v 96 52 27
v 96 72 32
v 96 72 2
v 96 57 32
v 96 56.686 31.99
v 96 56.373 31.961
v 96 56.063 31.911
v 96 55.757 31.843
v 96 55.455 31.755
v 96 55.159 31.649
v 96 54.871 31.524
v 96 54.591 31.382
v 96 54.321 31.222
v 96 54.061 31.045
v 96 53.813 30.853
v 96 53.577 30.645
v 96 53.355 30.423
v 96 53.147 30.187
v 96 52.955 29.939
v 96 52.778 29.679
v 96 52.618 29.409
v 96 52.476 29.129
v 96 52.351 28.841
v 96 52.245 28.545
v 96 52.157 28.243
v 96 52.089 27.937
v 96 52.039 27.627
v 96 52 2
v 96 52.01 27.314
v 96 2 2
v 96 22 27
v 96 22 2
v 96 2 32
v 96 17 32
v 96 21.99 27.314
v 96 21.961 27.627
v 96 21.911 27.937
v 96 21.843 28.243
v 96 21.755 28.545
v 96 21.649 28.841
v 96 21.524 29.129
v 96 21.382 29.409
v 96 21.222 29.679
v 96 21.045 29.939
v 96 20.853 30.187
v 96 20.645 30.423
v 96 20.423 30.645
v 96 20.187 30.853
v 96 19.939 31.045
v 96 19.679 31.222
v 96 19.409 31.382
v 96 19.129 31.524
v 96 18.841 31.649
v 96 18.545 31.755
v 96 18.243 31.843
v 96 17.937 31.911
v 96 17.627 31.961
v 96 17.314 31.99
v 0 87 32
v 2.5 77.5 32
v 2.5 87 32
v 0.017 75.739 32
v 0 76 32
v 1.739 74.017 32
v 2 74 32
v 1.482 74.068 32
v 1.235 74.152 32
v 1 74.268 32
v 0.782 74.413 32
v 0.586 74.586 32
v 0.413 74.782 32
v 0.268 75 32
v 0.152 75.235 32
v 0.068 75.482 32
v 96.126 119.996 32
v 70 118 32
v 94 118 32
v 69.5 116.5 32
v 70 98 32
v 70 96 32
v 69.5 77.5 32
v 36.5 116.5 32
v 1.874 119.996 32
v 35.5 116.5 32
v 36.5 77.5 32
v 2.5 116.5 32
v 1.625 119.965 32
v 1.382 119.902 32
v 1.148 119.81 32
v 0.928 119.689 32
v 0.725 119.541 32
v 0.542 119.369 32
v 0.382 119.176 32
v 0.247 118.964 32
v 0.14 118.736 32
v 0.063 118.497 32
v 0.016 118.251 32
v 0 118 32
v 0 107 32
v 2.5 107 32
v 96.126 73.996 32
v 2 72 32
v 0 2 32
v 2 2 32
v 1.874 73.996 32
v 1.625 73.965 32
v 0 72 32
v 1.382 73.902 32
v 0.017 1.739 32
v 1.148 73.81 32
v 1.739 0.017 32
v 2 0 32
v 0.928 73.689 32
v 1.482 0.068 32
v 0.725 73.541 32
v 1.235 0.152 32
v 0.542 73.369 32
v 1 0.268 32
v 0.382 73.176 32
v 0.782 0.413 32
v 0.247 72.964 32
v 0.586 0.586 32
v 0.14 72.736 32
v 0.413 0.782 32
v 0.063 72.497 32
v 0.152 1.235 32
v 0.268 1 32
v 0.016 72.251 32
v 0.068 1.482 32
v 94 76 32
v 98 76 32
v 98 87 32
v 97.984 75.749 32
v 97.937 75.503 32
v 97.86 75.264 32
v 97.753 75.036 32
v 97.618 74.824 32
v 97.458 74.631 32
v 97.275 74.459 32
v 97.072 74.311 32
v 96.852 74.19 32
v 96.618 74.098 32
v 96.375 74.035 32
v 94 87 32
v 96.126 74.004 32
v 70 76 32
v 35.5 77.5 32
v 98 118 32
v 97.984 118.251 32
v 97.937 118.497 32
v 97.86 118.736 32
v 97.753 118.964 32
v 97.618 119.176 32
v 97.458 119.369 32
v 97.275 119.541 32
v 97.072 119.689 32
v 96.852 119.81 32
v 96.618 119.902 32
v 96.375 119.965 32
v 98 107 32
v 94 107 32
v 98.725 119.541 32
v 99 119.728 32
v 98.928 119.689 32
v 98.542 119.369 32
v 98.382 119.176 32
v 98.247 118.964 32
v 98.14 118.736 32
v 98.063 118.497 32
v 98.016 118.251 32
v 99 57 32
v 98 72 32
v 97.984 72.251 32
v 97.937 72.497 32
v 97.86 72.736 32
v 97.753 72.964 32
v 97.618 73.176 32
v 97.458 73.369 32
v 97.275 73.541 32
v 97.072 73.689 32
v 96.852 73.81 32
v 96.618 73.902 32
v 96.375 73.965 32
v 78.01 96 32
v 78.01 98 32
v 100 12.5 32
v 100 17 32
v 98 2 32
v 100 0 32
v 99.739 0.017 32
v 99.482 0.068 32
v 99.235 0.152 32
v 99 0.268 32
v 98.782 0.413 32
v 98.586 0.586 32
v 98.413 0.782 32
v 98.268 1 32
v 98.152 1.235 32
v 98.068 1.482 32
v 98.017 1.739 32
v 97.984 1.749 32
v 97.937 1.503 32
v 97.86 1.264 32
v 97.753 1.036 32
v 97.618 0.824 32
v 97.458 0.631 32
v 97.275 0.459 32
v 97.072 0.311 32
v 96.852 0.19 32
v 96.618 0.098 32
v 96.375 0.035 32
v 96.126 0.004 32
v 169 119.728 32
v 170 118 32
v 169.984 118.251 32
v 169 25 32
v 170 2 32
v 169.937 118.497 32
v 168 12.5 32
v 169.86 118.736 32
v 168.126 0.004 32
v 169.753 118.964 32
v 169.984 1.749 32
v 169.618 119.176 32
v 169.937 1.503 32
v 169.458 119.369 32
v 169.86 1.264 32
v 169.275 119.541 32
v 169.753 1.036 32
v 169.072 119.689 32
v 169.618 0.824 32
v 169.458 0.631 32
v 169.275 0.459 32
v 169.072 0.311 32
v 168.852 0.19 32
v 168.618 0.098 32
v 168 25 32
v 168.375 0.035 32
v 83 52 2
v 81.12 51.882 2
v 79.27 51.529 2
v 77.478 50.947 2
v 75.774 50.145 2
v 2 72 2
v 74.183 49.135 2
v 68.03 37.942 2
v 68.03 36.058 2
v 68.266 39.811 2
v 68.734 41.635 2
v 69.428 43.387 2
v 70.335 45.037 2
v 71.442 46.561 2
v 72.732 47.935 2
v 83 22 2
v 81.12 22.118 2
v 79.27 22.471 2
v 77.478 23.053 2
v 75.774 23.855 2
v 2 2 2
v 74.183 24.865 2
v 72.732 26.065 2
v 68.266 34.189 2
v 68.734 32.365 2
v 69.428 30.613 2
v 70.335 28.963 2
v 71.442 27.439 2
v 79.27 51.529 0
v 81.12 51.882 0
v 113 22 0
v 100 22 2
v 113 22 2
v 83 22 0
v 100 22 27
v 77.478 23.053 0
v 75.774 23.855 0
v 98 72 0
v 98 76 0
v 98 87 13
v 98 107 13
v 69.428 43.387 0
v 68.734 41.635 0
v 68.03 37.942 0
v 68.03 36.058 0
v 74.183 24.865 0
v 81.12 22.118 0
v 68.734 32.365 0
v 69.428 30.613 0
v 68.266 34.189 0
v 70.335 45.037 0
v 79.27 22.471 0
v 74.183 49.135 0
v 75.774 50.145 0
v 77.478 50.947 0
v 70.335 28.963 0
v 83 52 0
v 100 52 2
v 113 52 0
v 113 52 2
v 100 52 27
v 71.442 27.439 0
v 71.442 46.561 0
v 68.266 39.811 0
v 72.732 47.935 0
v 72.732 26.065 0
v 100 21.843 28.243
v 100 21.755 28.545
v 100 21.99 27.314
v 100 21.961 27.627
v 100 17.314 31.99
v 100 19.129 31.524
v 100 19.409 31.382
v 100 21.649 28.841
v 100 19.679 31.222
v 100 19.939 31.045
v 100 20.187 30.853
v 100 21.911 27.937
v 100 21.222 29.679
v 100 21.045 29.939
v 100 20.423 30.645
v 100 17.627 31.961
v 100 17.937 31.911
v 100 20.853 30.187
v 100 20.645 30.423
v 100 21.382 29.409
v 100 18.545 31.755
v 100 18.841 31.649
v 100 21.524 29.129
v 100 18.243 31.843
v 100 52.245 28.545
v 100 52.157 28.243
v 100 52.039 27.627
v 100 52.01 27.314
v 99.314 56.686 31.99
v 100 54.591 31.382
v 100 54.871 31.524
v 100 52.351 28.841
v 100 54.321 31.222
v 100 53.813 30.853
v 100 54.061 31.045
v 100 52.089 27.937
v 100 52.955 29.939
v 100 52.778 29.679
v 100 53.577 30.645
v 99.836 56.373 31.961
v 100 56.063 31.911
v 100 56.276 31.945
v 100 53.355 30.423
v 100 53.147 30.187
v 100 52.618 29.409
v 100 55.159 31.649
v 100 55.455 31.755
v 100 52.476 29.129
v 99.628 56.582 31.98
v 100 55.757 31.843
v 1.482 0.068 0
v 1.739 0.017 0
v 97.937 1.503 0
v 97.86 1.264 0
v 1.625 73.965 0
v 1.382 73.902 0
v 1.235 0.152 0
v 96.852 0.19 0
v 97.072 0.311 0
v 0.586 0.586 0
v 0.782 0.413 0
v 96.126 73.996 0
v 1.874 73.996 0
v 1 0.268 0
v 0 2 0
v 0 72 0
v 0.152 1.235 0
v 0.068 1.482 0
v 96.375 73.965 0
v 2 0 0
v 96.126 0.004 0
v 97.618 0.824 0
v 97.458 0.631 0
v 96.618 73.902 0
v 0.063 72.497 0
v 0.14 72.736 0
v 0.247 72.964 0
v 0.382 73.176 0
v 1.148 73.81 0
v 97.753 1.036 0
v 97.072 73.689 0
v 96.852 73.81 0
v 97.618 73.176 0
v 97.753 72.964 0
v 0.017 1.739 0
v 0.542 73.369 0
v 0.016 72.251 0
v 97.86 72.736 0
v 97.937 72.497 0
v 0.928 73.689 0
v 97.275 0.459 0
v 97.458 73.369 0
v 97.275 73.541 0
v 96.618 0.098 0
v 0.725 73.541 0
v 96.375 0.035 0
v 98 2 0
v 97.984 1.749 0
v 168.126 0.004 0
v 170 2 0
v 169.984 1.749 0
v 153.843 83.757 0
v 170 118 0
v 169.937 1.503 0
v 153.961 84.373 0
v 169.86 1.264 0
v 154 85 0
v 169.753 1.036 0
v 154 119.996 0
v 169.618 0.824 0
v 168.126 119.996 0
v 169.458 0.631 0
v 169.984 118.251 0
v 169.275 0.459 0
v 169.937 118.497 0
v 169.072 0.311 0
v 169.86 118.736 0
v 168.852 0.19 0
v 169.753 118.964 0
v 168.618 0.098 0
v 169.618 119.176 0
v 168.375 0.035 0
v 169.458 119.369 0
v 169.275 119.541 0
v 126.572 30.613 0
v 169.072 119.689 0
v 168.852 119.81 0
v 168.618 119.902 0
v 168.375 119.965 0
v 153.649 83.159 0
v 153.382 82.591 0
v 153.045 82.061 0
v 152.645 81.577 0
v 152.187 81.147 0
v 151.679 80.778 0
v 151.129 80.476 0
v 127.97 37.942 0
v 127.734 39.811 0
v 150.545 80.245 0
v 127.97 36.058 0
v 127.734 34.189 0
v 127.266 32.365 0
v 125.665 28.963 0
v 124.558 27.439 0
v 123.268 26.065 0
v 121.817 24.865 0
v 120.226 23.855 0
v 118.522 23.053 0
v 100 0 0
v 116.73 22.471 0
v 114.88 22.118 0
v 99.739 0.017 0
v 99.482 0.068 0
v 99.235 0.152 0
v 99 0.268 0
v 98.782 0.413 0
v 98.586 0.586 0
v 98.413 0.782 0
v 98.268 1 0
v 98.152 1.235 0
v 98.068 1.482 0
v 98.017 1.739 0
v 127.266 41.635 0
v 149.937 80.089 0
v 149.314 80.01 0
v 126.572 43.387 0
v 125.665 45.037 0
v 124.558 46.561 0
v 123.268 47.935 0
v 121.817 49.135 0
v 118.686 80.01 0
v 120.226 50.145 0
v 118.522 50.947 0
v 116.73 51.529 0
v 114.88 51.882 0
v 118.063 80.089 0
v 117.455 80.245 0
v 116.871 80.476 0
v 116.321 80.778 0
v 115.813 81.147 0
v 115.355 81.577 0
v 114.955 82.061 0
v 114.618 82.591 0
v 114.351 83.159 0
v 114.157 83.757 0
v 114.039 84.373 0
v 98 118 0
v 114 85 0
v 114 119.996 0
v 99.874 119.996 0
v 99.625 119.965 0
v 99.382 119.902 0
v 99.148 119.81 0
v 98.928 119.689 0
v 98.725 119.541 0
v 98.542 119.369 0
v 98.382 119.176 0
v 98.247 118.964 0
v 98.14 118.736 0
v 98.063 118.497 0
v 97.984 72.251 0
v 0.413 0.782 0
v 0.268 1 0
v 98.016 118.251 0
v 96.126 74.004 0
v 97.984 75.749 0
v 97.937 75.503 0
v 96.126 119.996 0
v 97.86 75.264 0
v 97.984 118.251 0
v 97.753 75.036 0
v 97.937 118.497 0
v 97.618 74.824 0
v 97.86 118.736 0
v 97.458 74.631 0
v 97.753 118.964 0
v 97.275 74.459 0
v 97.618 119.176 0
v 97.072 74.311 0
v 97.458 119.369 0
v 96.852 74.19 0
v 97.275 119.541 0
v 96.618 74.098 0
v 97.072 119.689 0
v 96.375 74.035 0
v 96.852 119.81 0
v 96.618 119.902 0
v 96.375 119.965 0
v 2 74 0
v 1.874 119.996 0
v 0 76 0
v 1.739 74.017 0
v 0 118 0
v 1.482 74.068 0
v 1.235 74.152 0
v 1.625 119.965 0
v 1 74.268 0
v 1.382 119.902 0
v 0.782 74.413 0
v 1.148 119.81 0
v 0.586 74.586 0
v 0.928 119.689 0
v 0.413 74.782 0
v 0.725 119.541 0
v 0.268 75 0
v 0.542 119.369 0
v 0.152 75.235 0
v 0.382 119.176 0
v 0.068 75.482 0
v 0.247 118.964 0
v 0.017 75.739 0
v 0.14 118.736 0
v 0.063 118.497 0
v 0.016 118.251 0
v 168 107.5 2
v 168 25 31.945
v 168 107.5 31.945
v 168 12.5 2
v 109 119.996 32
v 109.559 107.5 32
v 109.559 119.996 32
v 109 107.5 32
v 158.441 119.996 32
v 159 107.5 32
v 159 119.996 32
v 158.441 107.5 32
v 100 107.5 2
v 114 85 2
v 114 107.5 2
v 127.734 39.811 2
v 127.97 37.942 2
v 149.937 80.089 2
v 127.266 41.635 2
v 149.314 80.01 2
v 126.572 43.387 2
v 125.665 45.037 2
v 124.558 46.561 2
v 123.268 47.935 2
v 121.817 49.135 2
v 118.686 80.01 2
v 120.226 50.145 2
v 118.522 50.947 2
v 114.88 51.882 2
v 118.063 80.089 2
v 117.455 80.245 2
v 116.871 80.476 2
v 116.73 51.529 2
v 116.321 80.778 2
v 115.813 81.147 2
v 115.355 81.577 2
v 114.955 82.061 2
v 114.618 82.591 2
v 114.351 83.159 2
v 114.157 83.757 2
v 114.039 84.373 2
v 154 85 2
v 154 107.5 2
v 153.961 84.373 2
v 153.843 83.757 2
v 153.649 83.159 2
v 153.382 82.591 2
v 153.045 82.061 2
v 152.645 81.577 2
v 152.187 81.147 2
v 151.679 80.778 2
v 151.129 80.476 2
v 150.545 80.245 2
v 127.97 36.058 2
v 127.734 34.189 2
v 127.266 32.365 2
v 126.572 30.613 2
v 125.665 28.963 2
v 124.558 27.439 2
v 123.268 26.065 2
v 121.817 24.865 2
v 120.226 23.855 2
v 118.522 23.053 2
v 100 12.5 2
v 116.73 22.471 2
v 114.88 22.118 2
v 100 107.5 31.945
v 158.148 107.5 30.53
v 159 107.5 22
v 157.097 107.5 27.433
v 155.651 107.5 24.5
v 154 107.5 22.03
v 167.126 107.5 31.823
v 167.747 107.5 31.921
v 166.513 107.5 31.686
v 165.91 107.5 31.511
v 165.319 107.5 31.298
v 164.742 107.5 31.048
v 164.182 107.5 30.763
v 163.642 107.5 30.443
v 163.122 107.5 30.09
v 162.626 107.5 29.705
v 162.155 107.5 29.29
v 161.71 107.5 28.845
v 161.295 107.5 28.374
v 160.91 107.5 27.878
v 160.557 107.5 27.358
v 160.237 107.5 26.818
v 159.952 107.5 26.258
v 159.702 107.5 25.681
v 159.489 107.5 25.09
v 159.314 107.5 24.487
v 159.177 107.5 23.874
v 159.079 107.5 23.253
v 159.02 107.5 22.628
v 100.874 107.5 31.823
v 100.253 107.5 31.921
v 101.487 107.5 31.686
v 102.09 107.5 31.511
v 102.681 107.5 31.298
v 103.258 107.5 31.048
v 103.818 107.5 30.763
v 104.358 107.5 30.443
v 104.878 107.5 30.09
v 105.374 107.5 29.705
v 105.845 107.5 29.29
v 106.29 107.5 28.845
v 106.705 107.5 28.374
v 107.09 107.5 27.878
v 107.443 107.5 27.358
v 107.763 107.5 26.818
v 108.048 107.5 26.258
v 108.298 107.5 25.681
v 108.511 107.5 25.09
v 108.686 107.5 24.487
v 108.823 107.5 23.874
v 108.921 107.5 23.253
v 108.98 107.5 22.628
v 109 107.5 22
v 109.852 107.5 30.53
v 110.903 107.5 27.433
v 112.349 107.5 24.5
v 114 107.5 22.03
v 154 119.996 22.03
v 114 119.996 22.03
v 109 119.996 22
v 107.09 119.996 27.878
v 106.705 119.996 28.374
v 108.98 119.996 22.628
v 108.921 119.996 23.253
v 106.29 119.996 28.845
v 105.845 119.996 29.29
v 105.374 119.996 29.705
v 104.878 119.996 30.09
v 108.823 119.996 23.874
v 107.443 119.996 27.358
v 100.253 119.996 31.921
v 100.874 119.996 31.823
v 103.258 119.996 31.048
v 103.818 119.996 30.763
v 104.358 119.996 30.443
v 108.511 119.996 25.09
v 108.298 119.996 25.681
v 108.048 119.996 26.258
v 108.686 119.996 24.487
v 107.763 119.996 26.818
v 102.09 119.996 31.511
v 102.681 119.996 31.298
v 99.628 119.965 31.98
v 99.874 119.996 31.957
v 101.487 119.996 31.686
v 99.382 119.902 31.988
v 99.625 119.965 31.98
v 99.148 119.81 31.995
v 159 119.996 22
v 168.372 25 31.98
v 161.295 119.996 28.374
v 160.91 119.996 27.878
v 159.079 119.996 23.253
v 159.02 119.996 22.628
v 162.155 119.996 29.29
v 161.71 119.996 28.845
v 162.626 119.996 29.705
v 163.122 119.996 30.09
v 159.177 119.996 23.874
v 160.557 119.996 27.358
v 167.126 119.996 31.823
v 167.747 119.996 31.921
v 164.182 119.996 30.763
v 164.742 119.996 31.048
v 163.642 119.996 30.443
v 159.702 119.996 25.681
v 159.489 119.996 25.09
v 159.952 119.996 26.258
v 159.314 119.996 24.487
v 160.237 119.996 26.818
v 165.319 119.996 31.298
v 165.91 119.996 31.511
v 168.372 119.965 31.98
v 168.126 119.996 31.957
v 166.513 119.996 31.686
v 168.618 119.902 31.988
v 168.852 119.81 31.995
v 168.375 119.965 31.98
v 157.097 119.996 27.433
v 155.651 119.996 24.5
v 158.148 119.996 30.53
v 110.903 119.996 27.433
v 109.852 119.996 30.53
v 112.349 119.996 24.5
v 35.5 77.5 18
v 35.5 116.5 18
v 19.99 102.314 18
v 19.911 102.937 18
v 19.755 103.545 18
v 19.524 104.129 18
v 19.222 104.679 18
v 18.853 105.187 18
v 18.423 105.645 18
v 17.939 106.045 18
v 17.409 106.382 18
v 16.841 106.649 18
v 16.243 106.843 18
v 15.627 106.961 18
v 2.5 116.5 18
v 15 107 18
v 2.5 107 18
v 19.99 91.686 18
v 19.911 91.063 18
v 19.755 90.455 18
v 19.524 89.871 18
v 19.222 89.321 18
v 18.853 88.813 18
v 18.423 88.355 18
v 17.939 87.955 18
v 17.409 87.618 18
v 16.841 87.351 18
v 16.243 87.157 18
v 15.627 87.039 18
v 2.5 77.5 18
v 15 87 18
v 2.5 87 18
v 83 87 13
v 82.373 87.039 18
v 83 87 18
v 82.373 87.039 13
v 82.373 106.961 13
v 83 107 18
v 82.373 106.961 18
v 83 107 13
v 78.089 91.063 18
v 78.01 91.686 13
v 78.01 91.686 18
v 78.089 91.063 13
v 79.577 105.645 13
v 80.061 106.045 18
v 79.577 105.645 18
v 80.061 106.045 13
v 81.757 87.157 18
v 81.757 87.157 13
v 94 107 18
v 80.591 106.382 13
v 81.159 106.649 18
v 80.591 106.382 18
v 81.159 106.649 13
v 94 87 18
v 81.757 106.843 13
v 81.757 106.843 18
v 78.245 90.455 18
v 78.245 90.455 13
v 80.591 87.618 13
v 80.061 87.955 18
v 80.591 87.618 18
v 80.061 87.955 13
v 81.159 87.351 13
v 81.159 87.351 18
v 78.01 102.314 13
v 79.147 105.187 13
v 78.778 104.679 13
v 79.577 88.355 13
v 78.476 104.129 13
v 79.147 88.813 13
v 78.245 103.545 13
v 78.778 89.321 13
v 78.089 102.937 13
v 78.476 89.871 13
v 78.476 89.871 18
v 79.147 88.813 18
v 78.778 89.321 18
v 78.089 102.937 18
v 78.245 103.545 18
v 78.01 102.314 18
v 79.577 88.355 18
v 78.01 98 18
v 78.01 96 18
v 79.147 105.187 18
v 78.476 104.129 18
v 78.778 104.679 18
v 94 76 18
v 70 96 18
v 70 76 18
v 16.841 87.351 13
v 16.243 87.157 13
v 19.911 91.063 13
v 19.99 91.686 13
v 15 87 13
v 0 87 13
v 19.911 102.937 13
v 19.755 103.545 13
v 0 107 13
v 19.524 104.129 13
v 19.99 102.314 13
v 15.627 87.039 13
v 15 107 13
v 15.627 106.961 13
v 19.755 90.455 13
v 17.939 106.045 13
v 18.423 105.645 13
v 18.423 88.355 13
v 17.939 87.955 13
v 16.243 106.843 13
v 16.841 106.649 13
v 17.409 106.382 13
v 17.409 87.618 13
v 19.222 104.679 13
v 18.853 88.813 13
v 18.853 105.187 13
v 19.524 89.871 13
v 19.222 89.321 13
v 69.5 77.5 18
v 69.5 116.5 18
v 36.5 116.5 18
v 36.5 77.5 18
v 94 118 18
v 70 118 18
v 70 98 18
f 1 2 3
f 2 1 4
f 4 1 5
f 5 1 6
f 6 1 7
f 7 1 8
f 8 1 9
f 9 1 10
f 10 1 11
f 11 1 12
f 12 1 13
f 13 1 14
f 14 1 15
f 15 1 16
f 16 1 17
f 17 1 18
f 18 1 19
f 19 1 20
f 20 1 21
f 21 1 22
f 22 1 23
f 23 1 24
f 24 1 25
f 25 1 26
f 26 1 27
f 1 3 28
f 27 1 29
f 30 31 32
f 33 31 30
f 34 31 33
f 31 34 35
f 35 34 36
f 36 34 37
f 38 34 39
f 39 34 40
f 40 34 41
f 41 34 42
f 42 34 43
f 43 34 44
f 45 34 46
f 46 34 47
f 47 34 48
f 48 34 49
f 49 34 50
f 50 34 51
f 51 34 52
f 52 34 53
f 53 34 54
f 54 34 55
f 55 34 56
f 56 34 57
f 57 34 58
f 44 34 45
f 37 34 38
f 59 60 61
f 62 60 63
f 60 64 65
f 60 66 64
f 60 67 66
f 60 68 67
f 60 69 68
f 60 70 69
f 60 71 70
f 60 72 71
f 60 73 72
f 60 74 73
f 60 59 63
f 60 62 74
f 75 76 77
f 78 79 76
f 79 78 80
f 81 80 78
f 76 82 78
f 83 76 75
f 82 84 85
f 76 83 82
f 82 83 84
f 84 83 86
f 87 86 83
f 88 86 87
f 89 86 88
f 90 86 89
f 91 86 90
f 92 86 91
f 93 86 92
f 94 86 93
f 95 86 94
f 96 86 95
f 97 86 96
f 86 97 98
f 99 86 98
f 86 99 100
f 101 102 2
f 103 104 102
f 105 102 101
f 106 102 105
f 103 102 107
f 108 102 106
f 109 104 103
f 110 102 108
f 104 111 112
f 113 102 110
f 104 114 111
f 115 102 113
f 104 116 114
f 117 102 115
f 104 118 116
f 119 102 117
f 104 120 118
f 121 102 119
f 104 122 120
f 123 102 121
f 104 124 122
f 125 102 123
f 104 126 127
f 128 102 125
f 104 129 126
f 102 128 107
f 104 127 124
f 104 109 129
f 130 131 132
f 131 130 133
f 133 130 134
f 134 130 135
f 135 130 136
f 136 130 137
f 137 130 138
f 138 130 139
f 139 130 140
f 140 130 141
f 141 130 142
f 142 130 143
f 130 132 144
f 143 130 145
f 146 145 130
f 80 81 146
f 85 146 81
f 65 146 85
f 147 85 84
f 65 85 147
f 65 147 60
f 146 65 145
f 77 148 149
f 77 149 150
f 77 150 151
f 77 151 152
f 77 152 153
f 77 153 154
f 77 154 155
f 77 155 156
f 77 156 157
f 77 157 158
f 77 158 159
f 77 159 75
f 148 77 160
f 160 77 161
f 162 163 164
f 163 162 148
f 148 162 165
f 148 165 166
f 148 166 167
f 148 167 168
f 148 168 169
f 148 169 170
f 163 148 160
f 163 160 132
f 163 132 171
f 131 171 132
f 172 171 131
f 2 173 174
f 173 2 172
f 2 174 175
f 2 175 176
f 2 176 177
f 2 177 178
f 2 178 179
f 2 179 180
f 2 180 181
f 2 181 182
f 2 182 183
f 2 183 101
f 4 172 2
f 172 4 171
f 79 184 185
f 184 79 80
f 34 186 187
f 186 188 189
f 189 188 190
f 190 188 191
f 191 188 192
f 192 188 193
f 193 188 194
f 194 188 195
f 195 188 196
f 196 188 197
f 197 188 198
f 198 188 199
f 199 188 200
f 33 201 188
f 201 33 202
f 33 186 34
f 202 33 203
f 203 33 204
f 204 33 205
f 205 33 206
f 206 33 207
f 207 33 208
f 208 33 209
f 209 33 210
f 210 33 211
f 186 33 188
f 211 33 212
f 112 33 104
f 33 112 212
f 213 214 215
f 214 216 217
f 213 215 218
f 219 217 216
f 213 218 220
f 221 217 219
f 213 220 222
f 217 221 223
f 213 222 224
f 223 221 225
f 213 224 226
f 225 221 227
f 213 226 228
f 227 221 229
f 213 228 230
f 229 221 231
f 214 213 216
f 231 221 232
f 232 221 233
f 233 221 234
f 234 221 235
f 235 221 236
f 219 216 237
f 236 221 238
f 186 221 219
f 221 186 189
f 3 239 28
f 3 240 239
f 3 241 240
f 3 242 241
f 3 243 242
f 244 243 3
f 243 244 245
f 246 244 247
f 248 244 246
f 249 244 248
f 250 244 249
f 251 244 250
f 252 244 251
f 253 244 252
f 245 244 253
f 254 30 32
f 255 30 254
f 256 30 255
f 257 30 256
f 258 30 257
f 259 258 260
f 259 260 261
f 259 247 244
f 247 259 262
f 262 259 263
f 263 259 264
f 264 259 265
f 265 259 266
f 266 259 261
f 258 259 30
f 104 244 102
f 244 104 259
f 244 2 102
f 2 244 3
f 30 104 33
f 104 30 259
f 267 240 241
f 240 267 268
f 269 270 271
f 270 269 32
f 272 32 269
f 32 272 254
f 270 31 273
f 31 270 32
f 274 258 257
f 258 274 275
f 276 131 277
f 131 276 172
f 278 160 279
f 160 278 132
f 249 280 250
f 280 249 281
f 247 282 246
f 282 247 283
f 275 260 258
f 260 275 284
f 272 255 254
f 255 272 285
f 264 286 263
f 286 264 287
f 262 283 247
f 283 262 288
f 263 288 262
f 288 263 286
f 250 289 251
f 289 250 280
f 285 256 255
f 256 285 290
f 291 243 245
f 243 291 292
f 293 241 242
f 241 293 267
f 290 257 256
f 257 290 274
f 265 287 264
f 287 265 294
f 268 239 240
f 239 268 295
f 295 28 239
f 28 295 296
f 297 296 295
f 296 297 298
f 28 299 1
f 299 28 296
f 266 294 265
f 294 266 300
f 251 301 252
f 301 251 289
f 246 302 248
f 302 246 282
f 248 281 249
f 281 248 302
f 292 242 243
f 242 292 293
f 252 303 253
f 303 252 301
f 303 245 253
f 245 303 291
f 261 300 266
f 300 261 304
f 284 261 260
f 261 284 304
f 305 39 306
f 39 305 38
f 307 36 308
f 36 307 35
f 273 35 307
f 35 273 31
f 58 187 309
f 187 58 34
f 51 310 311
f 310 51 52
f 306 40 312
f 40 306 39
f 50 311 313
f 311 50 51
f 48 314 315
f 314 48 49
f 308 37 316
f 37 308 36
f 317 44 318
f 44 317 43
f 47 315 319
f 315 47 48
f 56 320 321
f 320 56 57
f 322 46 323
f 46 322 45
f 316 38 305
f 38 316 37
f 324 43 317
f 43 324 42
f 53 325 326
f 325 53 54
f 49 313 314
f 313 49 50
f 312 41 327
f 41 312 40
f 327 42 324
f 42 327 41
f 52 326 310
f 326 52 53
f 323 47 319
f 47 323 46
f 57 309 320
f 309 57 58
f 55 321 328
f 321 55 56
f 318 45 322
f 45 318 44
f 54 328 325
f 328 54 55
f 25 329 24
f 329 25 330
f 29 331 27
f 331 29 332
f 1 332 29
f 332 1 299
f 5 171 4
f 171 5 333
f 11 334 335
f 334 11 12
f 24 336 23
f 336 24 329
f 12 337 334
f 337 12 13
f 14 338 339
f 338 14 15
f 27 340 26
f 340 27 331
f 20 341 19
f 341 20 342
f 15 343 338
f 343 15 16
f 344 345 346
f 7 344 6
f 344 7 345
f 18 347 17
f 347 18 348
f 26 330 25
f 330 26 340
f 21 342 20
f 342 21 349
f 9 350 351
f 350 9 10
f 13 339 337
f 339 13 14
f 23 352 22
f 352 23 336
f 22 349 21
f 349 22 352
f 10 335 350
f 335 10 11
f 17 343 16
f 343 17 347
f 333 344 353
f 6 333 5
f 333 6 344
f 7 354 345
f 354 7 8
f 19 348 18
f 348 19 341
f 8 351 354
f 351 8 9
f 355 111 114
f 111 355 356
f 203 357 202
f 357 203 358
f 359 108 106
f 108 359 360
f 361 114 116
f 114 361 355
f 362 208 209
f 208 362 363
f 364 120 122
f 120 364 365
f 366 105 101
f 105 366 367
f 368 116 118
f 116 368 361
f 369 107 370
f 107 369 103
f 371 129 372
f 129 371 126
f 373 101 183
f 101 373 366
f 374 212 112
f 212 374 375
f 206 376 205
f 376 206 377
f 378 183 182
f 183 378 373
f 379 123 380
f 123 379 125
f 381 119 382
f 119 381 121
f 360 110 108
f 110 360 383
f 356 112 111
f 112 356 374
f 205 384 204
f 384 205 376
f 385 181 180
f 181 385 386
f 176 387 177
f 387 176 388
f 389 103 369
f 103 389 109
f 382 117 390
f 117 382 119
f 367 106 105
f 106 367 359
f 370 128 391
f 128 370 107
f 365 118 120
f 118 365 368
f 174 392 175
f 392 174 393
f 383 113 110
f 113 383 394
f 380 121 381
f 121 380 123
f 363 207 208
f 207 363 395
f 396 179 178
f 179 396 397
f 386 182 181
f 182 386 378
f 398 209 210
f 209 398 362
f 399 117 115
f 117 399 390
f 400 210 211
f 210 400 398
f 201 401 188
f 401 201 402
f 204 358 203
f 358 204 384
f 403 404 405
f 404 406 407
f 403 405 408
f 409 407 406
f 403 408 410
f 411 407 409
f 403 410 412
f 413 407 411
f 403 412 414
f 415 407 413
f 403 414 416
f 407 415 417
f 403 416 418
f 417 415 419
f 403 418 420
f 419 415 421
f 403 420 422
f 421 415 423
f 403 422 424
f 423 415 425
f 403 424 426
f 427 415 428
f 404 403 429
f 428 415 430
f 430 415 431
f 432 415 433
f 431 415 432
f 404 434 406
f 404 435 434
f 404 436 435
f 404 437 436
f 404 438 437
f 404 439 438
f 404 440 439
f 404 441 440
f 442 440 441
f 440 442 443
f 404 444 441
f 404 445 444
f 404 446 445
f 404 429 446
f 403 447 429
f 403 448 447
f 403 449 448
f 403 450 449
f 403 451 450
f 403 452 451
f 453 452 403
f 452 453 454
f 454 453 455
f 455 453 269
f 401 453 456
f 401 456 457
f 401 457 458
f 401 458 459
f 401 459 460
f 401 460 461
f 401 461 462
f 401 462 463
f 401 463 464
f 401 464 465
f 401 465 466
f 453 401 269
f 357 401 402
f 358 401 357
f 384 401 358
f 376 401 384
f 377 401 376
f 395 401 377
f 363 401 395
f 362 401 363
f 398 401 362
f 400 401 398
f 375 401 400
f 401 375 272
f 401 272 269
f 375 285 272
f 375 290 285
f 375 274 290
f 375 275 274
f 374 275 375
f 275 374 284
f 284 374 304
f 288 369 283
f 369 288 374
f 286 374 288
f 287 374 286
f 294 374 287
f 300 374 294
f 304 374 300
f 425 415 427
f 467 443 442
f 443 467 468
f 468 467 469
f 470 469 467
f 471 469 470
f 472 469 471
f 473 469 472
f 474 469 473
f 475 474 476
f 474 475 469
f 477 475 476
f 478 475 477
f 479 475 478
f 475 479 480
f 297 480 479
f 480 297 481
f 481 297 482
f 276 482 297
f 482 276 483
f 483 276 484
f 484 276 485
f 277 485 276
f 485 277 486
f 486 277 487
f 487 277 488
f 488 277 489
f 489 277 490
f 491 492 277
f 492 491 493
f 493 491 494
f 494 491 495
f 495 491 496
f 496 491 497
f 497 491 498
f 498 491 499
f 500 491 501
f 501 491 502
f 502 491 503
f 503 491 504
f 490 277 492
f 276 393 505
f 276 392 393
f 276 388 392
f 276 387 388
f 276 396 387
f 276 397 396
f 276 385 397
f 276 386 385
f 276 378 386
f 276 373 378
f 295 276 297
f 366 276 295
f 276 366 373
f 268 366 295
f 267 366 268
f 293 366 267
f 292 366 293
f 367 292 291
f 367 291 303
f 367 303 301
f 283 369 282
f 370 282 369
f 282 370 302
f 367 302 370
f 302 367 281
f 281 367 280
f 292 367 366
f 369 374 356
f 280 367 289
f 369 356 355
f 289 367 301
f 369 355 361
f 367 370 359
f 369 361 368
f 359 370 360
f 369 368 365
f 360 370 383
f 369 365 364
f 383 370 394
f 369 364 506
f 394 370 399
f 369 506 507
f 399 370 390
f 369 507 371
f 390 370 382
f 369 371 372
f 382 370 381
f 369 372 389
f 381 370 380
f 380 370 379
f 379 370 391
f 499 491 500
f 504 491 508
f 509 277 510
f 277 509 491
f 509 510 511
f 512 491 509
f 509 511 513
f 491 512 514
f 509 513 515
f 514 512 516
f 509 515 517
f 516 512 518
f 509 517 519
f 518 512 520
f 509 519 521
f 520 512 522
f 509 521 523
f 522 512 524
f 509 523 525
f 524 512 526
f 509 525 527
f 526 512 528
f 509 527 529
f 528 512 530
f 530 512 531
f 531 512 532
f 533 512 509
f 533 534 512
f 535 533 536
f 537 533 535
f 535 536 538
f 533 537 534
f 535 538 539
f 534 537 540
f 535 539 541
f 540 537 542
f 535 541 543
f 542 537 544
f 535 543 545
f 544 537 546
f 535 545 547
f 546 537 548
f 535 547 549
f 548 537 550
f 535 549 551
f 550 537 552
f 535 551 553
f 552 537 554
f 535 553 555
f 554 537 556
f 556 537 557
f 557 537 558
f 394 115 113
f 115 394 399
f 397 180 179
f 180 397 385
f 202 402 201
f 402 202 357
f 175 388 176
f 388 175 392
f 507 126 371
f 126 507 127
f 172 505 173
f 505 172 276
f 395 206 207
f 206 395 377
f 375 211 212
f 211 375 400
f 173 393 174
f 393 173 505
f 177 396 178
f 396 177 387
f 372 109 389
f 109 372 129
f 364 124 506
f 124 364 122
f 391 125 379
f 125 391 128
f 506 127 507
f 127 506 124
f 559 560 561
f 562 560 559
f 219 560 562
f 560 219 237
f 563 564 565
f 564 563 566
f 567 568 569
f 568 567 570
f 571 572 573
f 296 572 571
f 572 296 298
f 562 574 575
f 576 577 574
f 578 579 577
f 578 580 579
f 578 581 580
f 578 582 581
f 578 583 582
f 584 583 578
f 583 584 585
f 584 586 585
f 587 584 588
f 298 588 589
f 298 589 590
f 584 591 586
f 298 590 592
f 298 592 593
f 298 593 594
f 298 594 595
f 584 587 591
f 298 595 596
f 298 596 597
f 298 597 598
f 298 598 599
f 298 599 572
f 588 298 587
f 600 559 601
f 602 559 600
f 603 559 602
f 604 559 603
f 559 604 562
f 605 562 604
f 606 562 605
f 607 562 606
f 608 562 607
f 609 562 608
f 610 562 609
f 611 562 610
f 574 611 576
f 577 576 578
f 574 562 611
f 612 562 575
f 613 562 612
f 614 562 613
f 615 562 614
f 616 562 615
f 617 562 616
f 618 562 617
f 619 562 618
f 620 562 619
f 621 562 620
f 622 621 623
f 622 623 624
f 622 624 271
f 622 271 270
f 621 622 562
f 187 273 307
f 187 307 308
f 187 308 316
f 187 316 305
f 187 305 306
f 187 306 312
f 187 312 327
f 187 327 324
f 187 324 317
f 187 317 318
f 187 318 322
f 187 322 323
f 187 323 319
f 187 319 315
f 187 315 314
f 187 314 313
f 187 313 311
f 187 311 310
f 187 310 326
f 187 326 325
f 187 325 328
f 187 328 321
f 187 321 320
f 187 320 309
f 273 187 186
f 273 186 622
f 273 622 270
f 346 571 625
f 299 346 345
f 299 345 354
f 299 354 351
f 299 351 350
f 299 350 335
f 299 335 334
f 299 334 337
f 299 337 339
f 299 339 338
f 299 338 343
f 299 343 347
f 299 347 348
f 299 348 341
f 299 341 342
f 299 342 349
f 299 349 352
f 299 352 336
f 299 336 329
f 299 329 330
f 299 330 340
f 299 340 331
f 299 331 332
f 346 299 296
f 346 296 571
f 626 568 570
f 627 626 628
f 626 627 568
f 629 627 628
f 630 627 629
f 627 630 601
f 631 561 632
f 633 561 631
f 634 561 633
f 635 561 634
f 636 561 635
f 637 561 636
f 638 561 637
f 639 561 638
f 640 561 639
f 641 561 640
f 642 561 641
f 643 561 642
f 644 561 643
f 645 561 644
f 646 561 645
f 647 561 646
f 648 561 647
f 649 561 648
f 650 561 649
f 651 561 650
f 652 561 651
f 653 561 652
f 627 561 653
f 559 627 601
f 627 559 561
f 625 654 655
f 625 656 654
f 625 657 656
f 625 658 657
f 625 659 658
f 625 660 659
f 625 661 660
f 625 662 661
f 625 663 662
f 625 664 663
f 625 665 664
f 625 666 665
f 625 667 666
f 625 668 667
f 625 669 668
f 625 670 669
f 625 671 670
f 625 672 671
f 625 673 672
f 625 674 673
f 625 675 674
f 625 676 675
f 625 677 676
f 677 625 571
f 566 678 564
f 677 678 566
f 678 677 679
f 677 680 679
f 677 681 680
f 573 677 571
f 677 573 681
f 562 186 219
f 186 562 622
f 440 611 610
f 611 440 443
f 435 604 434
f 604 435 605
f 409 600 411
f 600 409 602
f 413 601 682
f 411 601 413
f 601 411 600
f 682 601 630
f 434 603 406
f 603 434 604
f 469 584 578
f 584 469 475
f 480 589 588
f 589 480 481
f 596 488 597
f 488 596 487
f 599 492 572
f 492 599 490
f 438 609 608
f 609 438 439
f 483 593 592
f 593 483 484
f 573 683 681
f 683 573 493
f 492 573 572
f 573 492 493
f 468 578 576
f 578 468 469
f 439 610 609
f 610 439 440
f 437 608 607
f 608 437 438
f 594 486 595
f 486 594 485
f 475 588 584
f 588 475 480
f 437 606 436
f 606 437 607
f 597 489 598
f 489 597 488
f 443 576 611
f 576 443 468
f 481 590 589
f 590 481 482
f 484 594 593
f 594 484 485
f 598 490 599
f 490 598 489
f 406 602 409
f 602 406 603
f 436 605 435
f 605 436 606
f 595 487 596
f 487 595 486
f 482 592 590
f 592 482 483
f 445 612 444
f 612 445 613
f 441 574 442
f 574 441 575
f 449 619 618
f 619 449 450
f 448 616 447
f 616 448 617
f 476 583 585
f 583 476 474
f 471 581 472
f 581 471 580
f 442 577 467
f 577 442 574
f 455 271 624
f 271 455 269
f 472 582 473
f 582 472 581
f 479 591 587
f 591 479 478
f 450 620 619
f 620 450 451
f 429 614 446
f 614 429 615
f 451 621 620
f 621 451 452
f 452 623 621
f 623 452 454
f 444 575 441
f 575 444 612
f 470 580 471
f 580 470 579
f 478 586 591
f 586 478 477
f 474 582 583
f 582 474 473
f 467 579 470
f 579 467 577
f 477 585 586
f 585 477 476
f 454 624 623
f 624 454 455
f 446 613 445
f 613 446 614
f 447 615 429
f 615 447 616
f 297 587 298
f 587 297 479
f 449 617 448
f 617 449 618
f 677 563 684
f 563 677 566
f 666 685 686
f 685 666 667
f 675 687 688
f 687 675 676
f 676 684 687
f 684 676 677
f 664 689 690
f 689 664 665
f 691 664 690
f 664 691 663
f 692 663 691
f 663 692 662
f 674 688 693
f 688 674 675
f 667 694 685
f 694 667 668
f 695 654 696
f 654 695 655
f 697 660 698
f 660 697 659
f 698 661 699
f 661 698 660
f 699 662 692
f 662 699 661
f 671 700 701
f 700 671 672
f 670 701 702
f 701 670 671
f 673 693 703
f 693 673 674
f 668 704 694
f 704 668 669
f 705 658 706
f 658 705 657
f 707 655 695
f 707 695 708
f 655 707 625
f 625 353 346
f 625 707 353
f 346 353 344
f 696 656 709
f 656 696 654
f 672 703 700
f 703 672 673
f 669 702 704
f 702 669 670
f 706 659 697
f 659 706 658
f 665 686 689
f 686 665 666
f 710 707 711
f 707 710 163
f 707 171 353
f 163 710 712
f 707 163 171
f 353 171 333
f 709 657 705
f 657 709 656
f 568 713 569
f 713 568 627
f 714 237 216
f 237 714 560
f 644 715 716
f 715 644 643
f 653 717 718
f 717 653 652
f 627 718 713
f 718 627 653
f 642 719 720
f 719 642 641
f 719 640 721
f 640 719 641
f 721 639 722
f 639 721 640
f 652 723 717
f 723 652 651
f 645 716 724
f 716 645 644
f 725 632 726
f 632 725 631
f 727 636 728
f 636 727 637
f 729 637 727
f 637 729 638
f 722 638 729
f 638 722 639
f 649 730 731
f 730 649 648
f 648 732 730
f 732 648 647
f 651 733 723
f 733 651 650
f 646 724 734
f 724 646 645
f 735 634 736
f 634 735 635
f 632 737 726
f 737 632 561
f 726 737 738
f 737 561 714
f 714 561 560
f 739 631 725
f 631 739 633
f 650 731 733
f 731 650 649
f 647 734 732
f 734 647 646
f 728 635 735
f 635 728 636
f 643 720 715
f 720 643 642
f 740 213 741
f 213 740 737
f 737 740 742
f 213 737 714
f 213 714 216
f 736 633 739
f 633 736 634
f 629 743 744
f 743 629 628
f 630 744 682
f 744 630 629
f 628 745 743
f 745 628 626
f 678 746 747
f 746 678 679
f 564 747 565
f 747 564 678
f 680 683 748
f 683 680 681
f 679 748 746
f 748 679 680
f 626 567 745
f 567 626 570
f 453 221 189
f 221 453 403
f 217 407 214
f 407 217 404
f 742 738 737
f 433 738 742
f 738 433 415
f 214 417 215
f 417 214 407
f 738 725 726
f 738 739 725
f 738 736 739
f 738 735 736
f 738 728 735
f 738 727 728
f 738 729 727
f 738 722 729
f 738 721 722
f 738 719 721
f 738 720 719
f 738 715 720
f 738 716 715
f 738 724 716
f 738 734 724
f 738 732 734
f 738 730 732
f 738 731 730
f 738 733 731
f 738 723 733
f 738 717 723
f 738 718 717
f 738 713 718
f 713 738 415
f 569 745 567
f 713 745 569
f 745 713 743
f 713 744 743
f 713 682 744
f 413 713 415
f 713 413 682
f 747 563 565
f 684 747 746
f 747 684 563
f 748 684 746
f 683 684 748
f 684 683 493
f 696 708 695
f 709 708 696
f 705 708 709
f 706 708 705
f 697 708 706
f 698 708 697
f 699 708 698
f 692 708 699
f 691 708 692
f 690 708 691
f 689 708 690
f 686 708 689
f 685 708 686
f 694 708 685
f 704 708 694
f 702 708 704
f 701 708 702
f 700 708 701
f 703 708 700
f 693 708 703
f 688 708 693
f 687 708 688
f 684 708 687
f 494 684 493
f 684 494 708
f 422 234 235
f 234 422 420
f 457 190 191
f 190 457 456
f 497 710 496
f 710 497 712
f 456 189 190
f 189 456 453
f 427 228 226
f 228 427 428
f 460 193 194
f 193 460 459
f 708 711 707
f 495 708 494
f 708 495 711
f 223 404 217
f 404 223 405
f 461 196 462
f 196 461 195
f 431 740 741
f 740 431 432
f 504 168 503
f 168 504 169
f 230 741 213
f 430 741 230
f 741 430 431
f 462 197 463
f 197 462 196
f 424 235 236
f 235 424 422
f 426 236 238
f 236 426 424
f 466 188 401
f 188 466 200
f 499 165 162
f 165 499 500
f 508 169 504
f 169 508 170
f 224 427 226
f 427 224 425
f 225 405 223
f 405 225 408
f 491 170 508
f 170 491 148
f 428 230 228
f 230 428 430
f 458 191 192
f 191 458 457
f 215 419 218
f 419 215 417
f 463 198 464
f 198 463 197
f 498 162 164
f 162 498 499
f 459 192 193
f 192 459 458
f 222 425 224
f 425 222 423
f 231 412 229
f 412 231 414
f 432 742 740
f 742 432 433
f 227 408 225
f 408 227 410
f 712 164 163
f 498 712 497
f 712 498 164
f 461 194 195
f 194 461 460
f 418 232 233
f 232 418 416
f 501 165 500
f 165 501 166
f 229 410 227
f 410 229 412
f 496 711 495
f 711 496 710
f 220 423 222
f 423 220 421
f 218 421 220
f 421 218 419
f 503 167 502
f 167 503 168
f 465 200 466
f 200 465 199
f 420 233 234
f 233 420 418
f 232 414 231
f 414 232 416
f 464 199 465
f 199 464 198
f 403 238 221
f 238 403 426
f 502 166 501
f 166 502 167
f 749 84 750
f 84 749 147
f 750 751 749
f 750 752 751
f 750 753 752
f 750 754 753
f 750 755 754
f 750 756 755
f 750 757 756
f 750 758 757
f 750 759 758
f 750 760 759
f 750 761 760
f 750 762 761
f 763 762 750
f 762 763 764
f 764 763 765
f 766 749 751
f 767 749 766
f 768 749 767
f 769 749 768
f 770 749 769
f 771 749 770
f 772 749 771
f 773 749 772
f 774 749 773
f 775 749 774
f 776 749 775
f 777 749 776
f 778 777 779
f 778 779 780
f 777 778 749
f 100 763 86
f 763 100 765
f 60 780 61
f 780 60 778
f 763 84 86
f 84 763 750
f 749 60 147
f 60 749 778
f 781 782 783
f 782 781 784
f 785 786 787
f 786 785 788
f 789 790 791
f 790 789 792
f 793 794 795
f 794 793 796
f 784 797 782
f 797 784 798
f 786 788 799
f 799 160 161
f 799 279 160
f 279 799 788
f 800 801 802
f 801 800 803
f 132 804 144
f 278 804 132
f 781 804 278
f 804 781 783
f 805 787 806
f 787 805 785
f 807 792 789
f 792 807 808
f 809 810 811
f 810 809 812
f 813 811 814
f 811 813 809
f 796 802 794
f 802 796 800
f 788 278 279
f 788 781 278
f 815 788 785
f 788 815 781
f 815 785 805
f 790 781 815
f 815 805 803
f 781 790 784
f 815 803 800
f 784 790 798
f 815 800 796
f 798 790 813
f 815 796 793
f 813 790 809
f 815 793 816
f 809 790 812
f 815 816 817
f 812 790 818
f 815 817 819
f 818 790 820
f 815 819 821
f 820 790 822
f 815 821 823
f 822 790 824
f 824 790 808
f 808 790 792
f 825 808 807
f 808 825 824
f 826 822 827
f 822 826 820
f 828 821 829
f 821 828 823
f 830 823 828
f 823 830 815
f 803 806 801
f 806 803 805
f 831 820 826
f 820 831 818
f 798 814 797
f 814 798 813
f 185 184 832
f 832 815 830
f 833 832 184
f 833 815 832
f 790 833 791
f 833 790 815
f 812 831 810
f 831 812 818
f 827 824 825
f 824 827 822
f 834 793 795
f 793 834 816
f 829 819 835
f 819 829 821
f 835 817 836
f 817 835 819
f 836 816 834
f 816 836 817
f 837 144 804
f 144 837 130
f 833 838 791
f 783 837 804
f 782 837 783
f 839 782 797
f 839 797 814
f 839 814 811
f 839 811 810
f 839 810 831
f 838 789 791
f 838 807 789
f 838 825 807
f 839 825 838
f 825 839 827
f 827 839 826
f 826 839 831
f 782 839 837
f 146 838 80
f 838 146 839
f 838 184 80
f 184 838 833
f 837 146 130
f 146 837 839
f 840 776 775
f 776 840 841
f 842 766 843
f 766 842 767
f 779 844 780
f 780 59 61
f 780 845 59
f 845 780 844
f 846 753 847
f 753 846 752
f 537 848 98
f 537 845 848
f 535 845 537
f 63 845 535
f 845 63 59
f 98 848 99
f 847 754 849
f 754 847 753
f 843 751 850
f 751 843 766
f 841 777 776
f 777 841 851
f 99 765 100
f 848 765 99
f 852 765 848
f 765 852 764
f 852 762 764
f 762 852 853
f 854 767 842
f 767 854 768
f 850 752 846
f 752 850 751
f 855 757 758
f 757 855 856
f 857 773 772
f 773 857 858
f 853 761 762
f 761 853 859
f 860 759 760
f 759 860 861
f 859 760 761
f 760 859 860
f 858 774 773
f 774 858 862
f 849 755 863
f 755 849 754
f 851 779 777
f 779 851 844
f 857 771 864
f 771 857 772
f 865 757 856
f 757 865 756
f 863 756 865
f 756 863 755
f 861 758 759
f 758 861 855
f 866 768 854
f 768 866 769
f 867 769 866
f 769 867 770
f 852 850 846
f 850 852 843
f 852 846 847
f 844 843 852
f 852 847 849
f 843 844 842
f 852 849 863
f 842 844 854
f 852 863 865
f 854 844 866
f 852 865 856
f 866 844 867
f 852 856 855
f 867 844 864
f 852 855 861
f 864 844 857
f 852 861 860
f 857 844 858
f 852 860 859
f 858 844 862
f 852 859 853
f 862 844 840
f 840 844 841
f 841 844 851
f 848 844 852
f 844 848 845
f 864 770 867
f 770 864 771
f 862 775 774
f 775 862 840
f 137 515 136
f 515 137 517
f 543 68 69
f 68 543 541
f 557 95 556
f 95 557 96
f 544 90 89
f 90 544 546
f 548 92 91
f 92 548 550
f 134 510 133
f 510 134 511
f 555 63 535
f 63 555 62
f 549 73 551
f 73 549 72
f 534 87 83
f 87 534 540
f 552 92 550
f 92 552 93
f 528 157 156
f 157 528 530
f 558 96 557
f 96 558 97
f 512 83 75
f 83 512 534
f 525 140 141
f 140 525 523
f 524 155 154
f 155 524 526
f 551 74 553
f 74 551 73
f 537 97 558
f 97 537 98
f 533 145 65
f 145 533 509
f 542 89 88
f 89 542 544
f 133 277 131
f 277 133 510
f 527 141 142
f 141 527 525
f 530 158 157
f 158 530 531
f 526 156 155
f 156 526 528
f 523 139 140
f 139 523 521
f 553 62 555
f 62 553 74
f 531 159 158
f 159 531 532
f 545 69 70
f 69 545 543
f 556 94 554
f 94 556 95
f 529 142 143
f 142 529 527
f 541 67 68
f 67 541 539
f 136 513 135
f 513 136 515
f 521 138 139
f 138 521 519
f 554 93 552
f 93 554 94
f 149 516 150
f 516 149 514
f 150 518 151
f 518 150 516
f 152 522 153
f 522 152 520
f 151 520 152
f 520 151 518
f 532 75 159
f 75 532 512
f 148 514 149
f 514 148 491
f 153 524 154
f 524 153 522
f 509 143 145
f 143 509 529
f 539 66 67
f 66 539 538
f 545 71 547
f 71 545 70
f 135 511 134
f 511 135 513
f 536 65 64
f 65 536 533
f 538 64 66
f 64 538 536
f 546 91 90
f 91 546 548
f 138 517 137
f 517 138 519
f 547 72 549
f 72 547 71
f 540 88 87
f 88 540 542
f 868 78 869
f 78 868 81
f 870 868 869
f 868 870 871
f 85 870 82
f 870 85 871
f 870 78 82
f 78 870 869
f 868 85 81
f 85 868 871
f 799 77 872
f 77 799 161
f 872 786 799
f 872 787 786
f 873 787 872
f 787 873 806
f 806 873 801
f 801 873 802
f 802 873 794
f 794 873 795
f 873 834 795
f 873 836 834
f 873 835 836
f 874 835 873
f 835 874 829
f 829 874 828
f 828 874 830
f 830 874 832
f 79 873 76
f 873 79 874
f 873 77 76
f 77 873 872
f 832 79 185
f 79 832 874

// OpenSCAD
$fn=48;
translate([0,0,0])
{
difference()
{
    translate(v = [2.00, 2.00, 0.00])
    {
        hull()
        {
            cylinder(center = false, r1 = 2, r2 = 2, h = 32);
            translate(v = [94.00, 0.00, 0.00])
            {
                cylinder(center = false, r1 = 2, r2 = 2, h = 32, $fn = 50);
            }
            translate(v = [0.00, 70.00, 0.00])
            {
                cylinder(center = false, r1 = 2, r2 = 2, h = 32, $fn = 50);
            }
            translate(v = [94.00, 70.00, 0.00])
            {
                cylinder(center = false, r1 = 2, r2 = 2, h = 32, $fn = 50);
            }
        }
    }
    translate(v = [2.00, 2.00, 2.00])
    {
        union()
        {
            union()
            {
                cube(size = [94.00, 70.00, 30.00], center = false); 
                translate(v = [96.00, 20.00, -10.00])
                {
                    rotate([0.00, 0.00, 90.00])
                    {
                        translate(v = [0.00, 0.00, 0.00])
                        {
                            hull()
                            {
                                translate(v = [15.00, 15.00, 0.00])
                                {
                                    cylinder(center = false, r1 = 15, r2 = 15, h = 40, $fn = 50);
                                }
                                translate(v = [15.00, 15.00, 0.00])
                                {
                                    cylinder(center = false, r1 = 15, r2 = 15, h = 40, $fn = 50);
                                }
                                translate(v = [0.00, 0.00, 0.00])
                                {
                                    cube(size = [30.00, 1.00, 40.00], center = false); 
                                }
                            }
                        }
                    }
                }
            }
            translate(v = [81.00, 15.00, 10.00])
            {
                rotate([0.00, 0.00, 90.00])
                {
                    translate(v = [0.00, 0.00, 0.00])
                    {
                        translate(v = [20.00, 0.00, 15.00])
                        {
                            union()
                            {
                                hull()
                                {
                                    rotate([90.00, 0.00, 0.00])
                                    {
                                        difference()
                                        {
                                            cylinder(center = true, r1 = 15, r2 = 15, h = 30);
                                            translate(v = [-30.00, 0.00, -15.00])
                                            {
                                                cube(size = [60.00, 30.00, 30.00], center = false); 
                                            }
                                        }
                                    }
                                    translate(v = [-15.00, -15.00, 0.00])
                                    {
                                        cube(size = [30.00, 30.00, 5.00], center = false); 
                                    }
                                }
                                translate(v = [-20.00, -15.00, 0.00])
                                {
                                    difference()
                                    {
                                        cube(size = [5.00, 30.00, 5.00], center = false); 
                                        translate(v = [0.00, 30.00, 0.00])
                                        {
                                            rotate([90.00, 0.00, 0.00])
                                            {
                                                cylinder(center = false, r1 = 5, r2 = 5, h = 30, $fn = 100);
                                            }
                                        }
                                    }
                                }
                                mirror([30.00, 0.00, 0.00])
                                {
                                    translate(v = [-20.00, -15.00, 0.00])
                                    {
                                        difference()
                                        {
                                            cube(size = [5.00, 30.00, 5.00], center = false); 
                                            translate(v = [0.00, 30.00, 0.00])
                                            {
                                                rotate([90.00, 0.00, 0.00])
                                                {
                                                    cylinder(center = false, r1 = 5, r2 = 5, h = 30, $fn = 100);
                                                }
                                            }
                                        }
                                    }
                                }
                            }
                        }
                    }
                }
            }
        }
    }
}

}
translate([98,0,0])
{
difference()
{
    translate(v = [2.00, 2.00, 0.00])
    {
        hull()
        {
            cylinder(center = false, r1 = 2, r2 = 2, h = 32);
            translate(v = [68.00, 0.00, 0.00])
            {
                cylinder(center = false, r1 = 2, r2 = 2, h = 32, $fn = 50);
            }
            translate(v = [0.00, 116.00, 0.00])
            {
                cylinder(center = false, r1 = 2, r2 = 2, h = 32, $fn = 50);
            }
            translate(v = [68.00, 116.00, 0.00])
            {
                cylinder(center = false, r1 = 2, r2 = 2, h = 32, $fn = 50);
            }
        }
    }
    translate(v = [2.00, 12.50, 2.00])
    {
        union()
        {
            union()
            {
                union()
                {
                    union()
                    {
                        cube(size = [68.00, 95.00, 30.00], center = false); 
                        translate(v = [14.00, 67.50, -10.00])
                        {
                            translate(v = [0.00, 0.00, 0.00])
                            {
                                hull()
                                {
                                    translate(v = [5.00, 5.00, 0.00])
                                    {
                                        cylinder(center = false, r1 = 5, r2 = 5, h = 40, $fn = 50);
                                    }
                                    translate(v = [35.00, 5.00, 0.00])
                                    {
                                        cylinder(center = false, r1 = 5, r2 = 5, h = 40, $fn = 50);
                                    }
                                    translate(v = [0.00, 39.00, 0.00])
                                    {
                                        cube(size = [40.00, 1.00, 40.00], center = false); 
                                    }
                                }
                            }
                        }
                    }
                    translate(v = [28.00, 32.50, -10.00])
                    {
                        rotate([0.00, 0.00, 90.00])
                        {
                            translate(v = [-23.00, 0.00, 0.00])
                            {
                                hull()
                                {
                                    translate(v = [15.00, 15.00, 0.00])
                                    {
                                        cylinder(center = false, r1 = 15, r2 = 15, h = 40, $fn = 50);
                                    }
                                    translate(v = [15.00, 15.00, 0.00])
                                    {
                                        cylinder(center = false, r1 = 15, r2 = 15, h = 40, $fn = 50);
                                    }
                                    translate(v = [0.00, 29.00, 0.00])
                                    {
                                        cube(size = [30.00, 1.00, 40.00], center = false); 
                                    }
                                }
                            }
                        }
                    }
                }
                translate(v = [-1.00, 60.00, 10.00])
                {
                    translate(v = [0.00, 0.00, 0.00])
                    {
                        translate(v = [35.00, 0.00, 25.00])
                        {
                            union()
                            {
                                hull()
                                {
                                    rotate([90.00, 0.00, 0.00])
                                    {
                                        difference()
                                        {
                                            cylinder(center = true, r1 = 25, r2 = 25, h = 95);
                                            translate(v = [-50.00, 0.00, -47.50])
                                            {
                                                cube(size = [100.00, 50.00, 95.00], center = false); 
                                            }
                                        }
                                    }
                                    translate(v = [-25.00, -47.50, 0.00])
                                    {
                                        cube(size = [50.00, 95.00, -5.00], center = false); 
                                    }
                                }
                                translate(v = [-35.00, -47.50, -15.00])
                                {
                                    difference()
                                    {
                                        cube(size = [10.00, 95.00, 10.00], center = false); 
                                        translate(v = [0.00, 95.00, 0.00])
                                        {
                                            rotate([90.00, 0.00, 0.00])
                                            {
                                                cylinder(center = false, r1 = 10, r2 = 10, h = 95, $fn = 100);
                                            }
                                        }
                                    }
                                }
                                mirror([50.00, 0.00, 0.00])
                                {
                                    translate(v = [-35.00, -47.50, -15.00])
                                    {
                                        difference()
                                        {
                                            cube(size = [10.00, 95.00, 10.00], center = false); 
                                            translate(v = [0.00, 95.00, 0.00])
                                            {
                                                rotate([90.00, 0.00, 0.00])
                                                {
                                                    cylinder(center = false, r1 = 10, r2 = 10, h = 95, $fn = 100);
                                                }
                                            }
                                        }
                                    }
                                }
                            }
                        }
                    }
                }
            }
            translate(v = [13.00, 27.50, 10.00])
            {
                rotate([0.00, 0.00, 90.00])
                {
                    translate(v = [-23.00, 0.00, 0.00])
                    {
                        translate(v = [20.00, 0.00, 15.00])
                        {
                            union()
                            {
                                hull()
                                {
                                    rotate([90.00, 0.00, 0.00])
                                    {
                                        difference()
                                        {
                                            cylinder(center = true, r1 = 15, r2 = 15, h = 30);
                                            translate(v = [-30.00, 0.00, -15.00])
                                            {
                                                cube(size = [60.00, 30.00, 30.00], center = false); 
                                            }
                                        }
                                    }
                                    translate(v = [-15.00, -15.00, 0.00])
                                    {
                                        cube(size = [30.00, 30.00, 5.00], center = false); 
                                    }
                                }
                                translate(v = [-20.00, -15.00, 0.00])
                                {
                                    difference()
                                    {
                                        cube(size = [5.00, 30.00, 5.00], center = false); 
                                        translate(v = [0.00, 30.00, 0.00])
                                        {
                                            rotate([90.00, 0.00, 0.00])
                                            {
                                                cylinder(center = false, r1 = 5, r2 = 5, h = 30, $fn = 100);
                                            }
                                        }
                                    }
                                }
                                mirror([30.00, 0.00, 0.00])
                                {
                                    translate(v = [-20.00, -15.00, 0.00])
                                    {
                                        difference()
                                        {
                                            cube(size = [5.00, 30.00, 5.00], center = false); 
                                            translate(v = [0.00, 30.00, 0.00])
                                            {
                                                rotate([90.00, 0.00, 0.00])
                                                {
                                                    cylinder(center = false, r1 = 5, r2 = 5, h = 30, $fn = 100);
                                                }
                                            }
                                        }
                                    }
                                }
                            }
                        }
                    }
                }
            }
        }
    }
}

}
translate([0,74,0])
{
difference()
{
    translate(v = [2.00, 2.00, 0.00])
    {
        hull()
        {
            cylinder(center = false, r1 = 2, r2 = 2, h = 32);
            translate(v = [94.00, 0.00, 0.00])
            {
                cylinder(center = false, r1 = 2, r2 = 2, h = 32, $fn = 50);
            }
            translate(v = [0.00, 42.00, 0.00])
            {
                cylinder(center = false, r1 = 2, r2 = 2, h = 32, $fn = 50);
            }
            translate(v = [94.00, 42.00, 0.00])
            {
                cylinder(center = false, r1 = 2, r2 = 2, h = 32, $fn = 50);
            }
        }
    }
    translate(v = [2.50, 3.50, 18.00])
    {
        union()
        {
            cube(size = [33.00, 39.00, 14.00], center = false); 
            translate(v = [95.50, 9.50, -5.00])
            {
                rotate([0.00, 0.00, 90.00])
                {
                    translate(v = [0.00, 0.00, 0.00])
                    {
                        hull()
                        {
                            translate(v = [5.00, 15.00, 0.00])
                            {
                                cylinder(center = false, r1 = 5, r2 = 5, h = 19, $fn = 50);
                            }
                            translate(v = [15.00, 15.00, 0.00])
                            {
                                cylinder(center = false, r1 = 5, r2 = 5, h = 19, $fn = 50);
                            }
                            translate(v = [0.00, 0.00, 0.00])
                            {
                                cube(size = [20.00, 1.00, 19.00], center = false); 
                            }
                        }
                    }
                }
            }
        }
    }
    translate(v = [36.50, 3.50, 18.00])
    {
        cube(size = [33.00, 39.00, 14.00], center = false); 
    }
    translate(v = [70.00, 2.00, 18.00])
    {
        union()
        {
            cube(size = [24.00, 20.00, 14.00], center = false); 
            translate(v = [-50.00, 0.00, -5.00])
            {
                rotate([0.00, 0.00, 90.00])
                {
                    translate(v = [11.00, 0.00, 0.00])
                    {
                        hull()
                        {
                            translate(v = [5.00, 5.00, 0.00])
                            {
                                cylinder(center = false, r1 = 5, r2 = 5, h = 19, $fn = 50);
                            }
                            translate(v = [15.00, 5.00, 0.00])
                            {
                                cylinder(center = false, r1 = 5, r2 = 5, h = 19, $fn = 50);
                            }
                            translate(v = [0.00, 19.00, 0.00])
                            {
                                cube(size = [20.00, 1.00, 19.00], center = false); 
                            }
                        }
                    }
                }
            }
        }
    }
    translate(v = [70.00, 24.00, 18.00])
    {
        cube(size = [24.00, 20.00, 14.00], center = false); 
    }
}

}
